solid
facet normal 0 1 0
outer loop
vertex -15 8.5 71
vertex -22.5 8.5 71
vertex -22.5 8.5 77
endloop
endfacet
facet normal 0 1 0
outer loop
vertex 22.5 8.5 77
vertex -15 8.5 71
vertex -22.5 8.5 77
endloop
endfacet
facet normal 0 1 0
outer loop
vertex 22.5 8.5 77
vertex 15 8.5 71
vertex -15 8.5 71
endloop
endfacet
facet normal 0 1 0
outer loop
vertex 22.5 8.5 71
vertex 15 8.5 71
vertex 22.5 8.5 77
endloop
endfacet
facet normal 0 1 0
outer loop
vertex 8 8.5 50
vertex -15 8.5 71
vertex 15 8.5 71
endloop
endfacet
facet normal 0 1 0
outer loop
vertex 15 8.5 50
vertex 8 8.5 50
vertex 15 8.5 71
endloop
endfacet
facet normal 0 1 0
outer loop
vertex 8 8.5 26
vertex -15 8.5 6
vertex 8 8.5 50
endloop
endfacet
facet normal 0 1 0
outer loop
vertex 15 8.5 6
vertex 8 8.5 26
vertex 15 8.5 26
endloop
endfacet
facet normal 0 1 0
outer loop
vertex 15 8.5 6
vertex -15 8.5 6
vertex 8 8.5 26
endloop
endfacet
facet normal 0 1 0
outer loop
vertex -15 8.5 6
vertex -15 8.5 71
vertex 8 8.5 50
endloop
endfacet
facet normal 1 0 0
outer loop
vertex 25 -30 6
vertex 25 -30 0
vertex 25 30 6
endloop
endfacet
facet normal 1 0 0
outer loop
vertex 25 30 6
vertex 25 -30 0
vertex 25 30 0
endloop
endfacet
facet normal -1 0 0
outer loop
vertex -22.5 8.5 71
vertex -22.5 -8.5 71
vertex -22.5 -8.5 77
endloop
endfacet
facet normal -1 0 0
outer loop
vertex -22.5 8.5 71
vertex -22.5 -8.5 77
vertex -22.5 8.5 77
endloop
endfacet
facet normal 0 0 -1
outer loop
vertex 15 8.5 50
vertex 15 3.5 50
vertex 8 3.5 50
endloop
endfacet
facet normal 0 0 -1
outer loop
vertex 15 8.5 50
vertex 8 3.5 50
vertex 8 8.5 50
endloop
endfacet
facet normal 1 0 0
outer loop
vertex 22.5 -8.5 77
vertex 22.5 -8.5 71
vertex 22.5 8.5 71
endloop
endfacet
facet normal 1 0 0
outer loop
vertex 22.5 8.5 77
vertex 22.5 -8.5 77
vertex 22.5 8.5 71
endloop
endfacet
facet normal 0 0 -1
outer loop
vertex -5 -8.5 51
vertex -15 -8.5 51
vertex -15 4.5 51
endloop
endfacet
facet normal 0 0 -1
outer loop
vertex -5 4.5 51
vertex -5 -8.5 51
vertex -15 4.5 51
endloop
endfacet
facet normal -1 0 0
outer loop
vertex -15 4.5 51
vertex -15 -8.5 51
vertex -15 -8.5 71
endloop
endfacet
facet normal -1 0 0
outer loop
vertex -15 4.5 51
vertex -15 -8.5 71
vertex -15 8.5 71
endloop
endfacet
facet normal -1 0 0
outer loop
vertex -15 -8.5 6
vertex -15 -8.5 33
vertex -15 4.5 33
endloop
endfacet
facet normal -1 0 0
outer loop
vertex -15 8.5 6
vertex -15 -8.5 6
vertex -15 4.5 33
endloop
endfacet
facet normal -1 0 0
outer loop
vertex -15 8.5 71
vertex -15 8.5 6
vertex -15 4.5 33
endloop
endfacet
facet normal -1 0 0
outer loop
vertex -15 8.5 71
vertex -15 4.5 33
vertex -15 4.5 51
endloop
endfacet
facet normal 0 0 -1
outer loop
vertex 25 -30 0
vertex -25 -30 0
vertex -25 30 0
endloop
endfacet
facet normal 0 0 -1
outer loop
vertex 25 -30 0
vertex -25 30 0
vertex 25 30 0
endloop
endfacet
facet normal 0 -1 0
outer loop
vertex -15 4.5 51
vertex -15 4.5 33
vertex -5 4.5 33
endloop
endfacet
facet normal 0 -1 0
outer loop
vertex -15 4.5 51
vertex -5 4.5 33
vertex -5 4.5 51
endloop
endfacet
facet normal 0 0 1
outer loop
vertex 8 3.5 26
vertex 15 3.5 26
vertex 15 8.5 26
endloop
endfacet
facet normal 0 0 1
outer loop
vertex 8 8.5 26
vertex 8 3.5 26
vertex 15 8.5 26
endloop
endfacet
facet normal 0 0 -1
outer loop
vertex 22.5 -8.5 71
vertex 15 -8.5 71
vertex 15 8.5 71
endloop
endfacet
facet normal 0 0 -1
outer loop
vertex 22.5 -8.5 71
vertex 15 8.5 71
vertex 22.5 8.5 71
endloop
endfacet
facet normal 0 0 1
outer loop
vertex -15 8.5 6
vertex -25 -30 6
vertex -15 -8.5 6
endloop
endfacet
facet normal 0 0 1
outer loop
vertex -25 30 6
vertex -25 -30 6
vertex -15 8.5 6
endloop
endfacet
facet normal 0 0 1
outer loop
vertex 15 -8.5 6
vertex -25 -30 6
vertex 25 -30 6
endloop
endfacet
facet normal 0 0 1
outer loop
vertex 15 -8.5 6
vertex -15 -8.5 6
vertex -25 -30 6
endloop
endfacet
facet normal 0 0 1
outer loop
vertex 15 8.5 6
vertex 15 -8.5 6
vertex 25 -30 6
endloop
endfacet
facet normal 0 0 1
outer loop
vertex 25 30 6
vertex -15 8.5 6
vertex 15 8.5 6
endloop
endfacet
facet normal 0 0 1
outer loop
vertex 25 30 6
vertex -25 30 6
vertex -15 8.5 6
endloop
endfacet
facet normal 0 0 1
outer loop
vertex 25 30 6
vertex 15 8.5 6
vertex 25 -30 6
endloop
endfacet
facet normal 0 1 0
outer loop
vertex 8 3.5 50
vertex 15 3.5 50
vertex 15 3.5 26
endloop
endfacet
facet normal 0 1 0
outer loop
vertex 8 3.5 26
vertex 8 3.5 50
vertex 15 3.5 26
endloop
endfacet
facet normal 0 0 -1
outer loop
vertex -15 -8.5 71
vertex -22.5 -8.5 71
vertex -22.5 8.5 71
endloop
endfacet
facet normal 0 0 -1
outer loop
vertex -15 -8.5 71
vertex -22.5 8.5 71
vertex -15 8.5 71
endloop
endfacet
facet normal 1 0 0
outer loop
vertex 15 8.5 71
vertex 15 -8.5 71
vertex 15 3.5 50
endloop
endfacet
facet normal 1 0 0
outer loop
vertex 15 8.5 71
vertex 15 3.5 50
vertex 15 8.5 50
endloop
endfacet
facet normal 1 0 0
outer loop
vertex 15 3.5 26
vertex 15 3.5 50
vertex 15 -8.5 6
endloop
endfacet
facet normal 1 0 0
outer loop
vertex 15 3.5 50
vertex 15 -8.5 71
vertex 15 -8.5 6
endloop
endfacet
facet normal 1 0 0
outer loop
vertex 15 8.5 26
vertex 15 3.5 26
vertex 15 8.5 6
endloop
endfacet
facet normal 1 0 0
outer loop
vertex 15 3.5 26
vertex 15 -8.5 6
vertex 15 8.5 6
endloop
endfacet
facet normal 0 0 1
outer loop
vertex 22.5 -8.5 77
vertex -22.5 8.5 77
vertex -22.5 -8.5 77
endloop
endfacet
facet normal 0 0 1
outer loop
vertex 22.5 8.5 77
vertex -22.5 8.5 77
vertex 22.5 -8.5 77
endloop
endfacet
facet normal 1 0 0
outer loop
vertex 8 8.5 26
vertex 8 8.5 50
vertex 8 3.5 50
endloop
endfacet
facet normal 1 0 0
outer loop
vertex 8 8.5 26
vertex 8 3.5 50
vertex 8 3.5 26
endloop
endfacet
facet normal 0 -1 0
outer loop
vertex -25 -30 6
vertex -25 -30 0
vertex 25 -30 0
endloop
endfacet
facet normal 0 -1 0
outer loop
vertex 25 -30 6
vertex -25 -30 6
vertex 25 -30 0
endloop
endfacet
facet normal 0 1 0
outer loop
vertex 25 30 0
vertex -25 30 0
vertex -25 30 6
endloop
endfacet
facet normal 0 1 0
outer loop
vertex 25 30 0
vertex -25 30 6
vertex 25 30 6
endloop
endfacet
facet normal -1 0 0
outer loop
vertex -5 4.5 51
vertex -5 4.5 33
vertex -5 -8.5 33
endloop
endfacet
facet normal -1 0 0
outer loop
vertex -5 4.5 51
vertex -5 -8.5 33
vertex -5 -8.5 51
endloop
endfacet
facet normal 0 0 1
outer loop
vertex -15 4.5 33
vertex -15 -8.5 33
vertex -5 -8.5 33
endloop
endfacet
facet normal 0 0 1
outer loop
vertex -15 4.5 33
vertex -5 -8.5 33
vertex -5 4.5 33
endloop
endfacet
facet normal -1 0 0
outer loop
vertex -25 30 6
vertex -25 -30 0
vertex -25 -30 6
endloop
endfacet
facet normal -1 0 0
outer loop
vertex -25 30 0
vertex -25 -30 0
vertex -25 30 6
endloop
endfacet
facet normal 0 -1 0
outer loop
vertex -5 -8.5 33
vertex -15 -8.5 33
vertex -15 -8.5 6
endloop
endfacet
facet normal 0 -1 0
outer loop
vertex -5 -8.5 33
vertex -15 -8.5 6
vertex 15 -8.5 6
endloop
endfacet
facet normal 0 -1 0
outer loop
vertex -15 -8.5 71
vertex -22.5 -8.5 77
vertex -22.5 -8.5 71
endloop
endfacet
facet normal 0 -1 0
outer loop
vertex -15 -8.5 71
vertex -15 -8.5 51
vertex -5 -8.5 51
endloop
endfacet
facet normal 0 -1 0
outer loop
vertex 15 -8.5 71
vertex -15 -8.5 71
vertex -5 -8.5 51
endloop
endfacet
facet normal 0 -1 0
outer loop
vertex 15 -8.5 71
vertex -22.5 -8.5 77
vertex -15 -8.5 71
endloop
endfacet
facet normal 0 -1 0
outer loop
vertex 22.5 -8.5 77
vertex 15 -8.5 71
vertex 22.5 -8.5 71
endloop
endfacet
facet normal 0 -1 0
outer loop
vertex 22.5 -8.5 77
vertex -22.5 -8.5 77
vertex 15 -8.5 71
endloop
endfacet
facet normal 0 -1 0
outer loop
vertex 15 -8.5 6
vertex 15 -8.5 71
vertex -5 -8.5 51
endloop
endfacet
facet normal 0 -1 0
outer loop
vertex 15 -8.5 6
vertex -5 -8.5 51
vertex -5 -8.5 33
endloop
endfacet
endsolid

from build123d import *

# Parameters (mm, degrees)
SKETCH_1_W          = 50
SKETCH_1_H          = 60
EXTRUDE_1_DEPTH     = 6
SKETCH_2_W          = 30
SKETCH_2_H          = 17
EXTRUDE_2_DEPTH     = 65
SKETCH_3_W          = 45
SKETCH_3_H          = 30
EXTRUDE_3_DEPTH     = 6
SKETCH_4_W          = 18
SKETCH_4_H          = 13
CUT_EXTRUDE_1_DEPTH = 10
SKETCH_5_W          = 24
SKETCH_5_H          = 5
CUT_EXTRUDE_2_DEPTH = 7
SKETCH_6_W          = 45
SKETCH_6_H          = 6
CUT_EXTRUDE_3_DEPTH = 6.5
SKETCH_7_W          = 45
SKETCH_7_H          = 6
CUT_EXTRUDE_4_DEPTH = 6.5


with BuildPart() as part:
    # Эскиз1 → Бобышка-Вытянуть1 (new body)
    with BuildSketch(Plane.XY):
        Rectangle(SKETCH_1_W, SKETCH_1_H)
    extrude(amount=EXTRUDE_1_DEPTH)

    # Эскиз2 → Бобышка-Вытянуть2 (add)
    with BuildSketch(Plane.XY.offset(6)):
        Rectangle(SKETCH_2_W, SKETCH_2_H)
    extrude(amount=EXTRUDE_2_DEPTH)

    # Эскиз3 → Бобышка-Вытянуть3 (add)
    with BuildSketch(Plane.XY.offset(71)):
        Rectangle(SKETCH_3_W, SKETCH_3_H)
    extrude(amount=EXTRUDE_3_DEPTH)

    # Эскиз4 → Вырез-Вытянуть1 (cut)
    with BuildSketch(Plane.ZY.offset(15)):
        with Locations((42, -2)):
            Rectangle(SKETCH_4_W, SKETCH_4_H)
    extrude(amount=-CUT_EXTRUDE_1_DEPTH, mode=Mode.SUBTRACT)

    # Эскиз5 → Вырез-Вытянуть2 (cut)
    with BuildSketch(Plane(origin=(15, 0, 0), x_dir=(0, 0, -1), z_dir=(1, 0, 0))):
        with Locations((-38, 6)):
            Rectangle(SKETCH_5_W, SKETCH_5_H)
    extrude(amount=-CUT_EXTRUDE_2_DEPTH, mode=Mode.SUBTRACT)

    # Эскиз6 → Вырез-Вытянуть3 (cut)
    with BuildSketch(Plane(origin=(0, 15, 0), x_dir=(1, 0, 0), z_dir=(0, 1, 0))):
        with Locations((0, -74)):
            Rectangle(SKETCH_6_W, SKETCH_6_H)
    extrude(amount=-CUT_EXTRUDE_3_DEPTH, mode=Mode.SUBTRACT)

    # Эскиз7 → Вырез-Вытянуть4 (cut)
    with BuildSketch(Plane.XZ.offset(15)):
        with Locations((0, 74)):
            Rectangle(SKETCH_7_W, SKETCH_7_H)
    extrude(amount=-CUT_EXTRUDE_4_DEPTH, mode=Mode.SUBTRACT)


solid = part.part
